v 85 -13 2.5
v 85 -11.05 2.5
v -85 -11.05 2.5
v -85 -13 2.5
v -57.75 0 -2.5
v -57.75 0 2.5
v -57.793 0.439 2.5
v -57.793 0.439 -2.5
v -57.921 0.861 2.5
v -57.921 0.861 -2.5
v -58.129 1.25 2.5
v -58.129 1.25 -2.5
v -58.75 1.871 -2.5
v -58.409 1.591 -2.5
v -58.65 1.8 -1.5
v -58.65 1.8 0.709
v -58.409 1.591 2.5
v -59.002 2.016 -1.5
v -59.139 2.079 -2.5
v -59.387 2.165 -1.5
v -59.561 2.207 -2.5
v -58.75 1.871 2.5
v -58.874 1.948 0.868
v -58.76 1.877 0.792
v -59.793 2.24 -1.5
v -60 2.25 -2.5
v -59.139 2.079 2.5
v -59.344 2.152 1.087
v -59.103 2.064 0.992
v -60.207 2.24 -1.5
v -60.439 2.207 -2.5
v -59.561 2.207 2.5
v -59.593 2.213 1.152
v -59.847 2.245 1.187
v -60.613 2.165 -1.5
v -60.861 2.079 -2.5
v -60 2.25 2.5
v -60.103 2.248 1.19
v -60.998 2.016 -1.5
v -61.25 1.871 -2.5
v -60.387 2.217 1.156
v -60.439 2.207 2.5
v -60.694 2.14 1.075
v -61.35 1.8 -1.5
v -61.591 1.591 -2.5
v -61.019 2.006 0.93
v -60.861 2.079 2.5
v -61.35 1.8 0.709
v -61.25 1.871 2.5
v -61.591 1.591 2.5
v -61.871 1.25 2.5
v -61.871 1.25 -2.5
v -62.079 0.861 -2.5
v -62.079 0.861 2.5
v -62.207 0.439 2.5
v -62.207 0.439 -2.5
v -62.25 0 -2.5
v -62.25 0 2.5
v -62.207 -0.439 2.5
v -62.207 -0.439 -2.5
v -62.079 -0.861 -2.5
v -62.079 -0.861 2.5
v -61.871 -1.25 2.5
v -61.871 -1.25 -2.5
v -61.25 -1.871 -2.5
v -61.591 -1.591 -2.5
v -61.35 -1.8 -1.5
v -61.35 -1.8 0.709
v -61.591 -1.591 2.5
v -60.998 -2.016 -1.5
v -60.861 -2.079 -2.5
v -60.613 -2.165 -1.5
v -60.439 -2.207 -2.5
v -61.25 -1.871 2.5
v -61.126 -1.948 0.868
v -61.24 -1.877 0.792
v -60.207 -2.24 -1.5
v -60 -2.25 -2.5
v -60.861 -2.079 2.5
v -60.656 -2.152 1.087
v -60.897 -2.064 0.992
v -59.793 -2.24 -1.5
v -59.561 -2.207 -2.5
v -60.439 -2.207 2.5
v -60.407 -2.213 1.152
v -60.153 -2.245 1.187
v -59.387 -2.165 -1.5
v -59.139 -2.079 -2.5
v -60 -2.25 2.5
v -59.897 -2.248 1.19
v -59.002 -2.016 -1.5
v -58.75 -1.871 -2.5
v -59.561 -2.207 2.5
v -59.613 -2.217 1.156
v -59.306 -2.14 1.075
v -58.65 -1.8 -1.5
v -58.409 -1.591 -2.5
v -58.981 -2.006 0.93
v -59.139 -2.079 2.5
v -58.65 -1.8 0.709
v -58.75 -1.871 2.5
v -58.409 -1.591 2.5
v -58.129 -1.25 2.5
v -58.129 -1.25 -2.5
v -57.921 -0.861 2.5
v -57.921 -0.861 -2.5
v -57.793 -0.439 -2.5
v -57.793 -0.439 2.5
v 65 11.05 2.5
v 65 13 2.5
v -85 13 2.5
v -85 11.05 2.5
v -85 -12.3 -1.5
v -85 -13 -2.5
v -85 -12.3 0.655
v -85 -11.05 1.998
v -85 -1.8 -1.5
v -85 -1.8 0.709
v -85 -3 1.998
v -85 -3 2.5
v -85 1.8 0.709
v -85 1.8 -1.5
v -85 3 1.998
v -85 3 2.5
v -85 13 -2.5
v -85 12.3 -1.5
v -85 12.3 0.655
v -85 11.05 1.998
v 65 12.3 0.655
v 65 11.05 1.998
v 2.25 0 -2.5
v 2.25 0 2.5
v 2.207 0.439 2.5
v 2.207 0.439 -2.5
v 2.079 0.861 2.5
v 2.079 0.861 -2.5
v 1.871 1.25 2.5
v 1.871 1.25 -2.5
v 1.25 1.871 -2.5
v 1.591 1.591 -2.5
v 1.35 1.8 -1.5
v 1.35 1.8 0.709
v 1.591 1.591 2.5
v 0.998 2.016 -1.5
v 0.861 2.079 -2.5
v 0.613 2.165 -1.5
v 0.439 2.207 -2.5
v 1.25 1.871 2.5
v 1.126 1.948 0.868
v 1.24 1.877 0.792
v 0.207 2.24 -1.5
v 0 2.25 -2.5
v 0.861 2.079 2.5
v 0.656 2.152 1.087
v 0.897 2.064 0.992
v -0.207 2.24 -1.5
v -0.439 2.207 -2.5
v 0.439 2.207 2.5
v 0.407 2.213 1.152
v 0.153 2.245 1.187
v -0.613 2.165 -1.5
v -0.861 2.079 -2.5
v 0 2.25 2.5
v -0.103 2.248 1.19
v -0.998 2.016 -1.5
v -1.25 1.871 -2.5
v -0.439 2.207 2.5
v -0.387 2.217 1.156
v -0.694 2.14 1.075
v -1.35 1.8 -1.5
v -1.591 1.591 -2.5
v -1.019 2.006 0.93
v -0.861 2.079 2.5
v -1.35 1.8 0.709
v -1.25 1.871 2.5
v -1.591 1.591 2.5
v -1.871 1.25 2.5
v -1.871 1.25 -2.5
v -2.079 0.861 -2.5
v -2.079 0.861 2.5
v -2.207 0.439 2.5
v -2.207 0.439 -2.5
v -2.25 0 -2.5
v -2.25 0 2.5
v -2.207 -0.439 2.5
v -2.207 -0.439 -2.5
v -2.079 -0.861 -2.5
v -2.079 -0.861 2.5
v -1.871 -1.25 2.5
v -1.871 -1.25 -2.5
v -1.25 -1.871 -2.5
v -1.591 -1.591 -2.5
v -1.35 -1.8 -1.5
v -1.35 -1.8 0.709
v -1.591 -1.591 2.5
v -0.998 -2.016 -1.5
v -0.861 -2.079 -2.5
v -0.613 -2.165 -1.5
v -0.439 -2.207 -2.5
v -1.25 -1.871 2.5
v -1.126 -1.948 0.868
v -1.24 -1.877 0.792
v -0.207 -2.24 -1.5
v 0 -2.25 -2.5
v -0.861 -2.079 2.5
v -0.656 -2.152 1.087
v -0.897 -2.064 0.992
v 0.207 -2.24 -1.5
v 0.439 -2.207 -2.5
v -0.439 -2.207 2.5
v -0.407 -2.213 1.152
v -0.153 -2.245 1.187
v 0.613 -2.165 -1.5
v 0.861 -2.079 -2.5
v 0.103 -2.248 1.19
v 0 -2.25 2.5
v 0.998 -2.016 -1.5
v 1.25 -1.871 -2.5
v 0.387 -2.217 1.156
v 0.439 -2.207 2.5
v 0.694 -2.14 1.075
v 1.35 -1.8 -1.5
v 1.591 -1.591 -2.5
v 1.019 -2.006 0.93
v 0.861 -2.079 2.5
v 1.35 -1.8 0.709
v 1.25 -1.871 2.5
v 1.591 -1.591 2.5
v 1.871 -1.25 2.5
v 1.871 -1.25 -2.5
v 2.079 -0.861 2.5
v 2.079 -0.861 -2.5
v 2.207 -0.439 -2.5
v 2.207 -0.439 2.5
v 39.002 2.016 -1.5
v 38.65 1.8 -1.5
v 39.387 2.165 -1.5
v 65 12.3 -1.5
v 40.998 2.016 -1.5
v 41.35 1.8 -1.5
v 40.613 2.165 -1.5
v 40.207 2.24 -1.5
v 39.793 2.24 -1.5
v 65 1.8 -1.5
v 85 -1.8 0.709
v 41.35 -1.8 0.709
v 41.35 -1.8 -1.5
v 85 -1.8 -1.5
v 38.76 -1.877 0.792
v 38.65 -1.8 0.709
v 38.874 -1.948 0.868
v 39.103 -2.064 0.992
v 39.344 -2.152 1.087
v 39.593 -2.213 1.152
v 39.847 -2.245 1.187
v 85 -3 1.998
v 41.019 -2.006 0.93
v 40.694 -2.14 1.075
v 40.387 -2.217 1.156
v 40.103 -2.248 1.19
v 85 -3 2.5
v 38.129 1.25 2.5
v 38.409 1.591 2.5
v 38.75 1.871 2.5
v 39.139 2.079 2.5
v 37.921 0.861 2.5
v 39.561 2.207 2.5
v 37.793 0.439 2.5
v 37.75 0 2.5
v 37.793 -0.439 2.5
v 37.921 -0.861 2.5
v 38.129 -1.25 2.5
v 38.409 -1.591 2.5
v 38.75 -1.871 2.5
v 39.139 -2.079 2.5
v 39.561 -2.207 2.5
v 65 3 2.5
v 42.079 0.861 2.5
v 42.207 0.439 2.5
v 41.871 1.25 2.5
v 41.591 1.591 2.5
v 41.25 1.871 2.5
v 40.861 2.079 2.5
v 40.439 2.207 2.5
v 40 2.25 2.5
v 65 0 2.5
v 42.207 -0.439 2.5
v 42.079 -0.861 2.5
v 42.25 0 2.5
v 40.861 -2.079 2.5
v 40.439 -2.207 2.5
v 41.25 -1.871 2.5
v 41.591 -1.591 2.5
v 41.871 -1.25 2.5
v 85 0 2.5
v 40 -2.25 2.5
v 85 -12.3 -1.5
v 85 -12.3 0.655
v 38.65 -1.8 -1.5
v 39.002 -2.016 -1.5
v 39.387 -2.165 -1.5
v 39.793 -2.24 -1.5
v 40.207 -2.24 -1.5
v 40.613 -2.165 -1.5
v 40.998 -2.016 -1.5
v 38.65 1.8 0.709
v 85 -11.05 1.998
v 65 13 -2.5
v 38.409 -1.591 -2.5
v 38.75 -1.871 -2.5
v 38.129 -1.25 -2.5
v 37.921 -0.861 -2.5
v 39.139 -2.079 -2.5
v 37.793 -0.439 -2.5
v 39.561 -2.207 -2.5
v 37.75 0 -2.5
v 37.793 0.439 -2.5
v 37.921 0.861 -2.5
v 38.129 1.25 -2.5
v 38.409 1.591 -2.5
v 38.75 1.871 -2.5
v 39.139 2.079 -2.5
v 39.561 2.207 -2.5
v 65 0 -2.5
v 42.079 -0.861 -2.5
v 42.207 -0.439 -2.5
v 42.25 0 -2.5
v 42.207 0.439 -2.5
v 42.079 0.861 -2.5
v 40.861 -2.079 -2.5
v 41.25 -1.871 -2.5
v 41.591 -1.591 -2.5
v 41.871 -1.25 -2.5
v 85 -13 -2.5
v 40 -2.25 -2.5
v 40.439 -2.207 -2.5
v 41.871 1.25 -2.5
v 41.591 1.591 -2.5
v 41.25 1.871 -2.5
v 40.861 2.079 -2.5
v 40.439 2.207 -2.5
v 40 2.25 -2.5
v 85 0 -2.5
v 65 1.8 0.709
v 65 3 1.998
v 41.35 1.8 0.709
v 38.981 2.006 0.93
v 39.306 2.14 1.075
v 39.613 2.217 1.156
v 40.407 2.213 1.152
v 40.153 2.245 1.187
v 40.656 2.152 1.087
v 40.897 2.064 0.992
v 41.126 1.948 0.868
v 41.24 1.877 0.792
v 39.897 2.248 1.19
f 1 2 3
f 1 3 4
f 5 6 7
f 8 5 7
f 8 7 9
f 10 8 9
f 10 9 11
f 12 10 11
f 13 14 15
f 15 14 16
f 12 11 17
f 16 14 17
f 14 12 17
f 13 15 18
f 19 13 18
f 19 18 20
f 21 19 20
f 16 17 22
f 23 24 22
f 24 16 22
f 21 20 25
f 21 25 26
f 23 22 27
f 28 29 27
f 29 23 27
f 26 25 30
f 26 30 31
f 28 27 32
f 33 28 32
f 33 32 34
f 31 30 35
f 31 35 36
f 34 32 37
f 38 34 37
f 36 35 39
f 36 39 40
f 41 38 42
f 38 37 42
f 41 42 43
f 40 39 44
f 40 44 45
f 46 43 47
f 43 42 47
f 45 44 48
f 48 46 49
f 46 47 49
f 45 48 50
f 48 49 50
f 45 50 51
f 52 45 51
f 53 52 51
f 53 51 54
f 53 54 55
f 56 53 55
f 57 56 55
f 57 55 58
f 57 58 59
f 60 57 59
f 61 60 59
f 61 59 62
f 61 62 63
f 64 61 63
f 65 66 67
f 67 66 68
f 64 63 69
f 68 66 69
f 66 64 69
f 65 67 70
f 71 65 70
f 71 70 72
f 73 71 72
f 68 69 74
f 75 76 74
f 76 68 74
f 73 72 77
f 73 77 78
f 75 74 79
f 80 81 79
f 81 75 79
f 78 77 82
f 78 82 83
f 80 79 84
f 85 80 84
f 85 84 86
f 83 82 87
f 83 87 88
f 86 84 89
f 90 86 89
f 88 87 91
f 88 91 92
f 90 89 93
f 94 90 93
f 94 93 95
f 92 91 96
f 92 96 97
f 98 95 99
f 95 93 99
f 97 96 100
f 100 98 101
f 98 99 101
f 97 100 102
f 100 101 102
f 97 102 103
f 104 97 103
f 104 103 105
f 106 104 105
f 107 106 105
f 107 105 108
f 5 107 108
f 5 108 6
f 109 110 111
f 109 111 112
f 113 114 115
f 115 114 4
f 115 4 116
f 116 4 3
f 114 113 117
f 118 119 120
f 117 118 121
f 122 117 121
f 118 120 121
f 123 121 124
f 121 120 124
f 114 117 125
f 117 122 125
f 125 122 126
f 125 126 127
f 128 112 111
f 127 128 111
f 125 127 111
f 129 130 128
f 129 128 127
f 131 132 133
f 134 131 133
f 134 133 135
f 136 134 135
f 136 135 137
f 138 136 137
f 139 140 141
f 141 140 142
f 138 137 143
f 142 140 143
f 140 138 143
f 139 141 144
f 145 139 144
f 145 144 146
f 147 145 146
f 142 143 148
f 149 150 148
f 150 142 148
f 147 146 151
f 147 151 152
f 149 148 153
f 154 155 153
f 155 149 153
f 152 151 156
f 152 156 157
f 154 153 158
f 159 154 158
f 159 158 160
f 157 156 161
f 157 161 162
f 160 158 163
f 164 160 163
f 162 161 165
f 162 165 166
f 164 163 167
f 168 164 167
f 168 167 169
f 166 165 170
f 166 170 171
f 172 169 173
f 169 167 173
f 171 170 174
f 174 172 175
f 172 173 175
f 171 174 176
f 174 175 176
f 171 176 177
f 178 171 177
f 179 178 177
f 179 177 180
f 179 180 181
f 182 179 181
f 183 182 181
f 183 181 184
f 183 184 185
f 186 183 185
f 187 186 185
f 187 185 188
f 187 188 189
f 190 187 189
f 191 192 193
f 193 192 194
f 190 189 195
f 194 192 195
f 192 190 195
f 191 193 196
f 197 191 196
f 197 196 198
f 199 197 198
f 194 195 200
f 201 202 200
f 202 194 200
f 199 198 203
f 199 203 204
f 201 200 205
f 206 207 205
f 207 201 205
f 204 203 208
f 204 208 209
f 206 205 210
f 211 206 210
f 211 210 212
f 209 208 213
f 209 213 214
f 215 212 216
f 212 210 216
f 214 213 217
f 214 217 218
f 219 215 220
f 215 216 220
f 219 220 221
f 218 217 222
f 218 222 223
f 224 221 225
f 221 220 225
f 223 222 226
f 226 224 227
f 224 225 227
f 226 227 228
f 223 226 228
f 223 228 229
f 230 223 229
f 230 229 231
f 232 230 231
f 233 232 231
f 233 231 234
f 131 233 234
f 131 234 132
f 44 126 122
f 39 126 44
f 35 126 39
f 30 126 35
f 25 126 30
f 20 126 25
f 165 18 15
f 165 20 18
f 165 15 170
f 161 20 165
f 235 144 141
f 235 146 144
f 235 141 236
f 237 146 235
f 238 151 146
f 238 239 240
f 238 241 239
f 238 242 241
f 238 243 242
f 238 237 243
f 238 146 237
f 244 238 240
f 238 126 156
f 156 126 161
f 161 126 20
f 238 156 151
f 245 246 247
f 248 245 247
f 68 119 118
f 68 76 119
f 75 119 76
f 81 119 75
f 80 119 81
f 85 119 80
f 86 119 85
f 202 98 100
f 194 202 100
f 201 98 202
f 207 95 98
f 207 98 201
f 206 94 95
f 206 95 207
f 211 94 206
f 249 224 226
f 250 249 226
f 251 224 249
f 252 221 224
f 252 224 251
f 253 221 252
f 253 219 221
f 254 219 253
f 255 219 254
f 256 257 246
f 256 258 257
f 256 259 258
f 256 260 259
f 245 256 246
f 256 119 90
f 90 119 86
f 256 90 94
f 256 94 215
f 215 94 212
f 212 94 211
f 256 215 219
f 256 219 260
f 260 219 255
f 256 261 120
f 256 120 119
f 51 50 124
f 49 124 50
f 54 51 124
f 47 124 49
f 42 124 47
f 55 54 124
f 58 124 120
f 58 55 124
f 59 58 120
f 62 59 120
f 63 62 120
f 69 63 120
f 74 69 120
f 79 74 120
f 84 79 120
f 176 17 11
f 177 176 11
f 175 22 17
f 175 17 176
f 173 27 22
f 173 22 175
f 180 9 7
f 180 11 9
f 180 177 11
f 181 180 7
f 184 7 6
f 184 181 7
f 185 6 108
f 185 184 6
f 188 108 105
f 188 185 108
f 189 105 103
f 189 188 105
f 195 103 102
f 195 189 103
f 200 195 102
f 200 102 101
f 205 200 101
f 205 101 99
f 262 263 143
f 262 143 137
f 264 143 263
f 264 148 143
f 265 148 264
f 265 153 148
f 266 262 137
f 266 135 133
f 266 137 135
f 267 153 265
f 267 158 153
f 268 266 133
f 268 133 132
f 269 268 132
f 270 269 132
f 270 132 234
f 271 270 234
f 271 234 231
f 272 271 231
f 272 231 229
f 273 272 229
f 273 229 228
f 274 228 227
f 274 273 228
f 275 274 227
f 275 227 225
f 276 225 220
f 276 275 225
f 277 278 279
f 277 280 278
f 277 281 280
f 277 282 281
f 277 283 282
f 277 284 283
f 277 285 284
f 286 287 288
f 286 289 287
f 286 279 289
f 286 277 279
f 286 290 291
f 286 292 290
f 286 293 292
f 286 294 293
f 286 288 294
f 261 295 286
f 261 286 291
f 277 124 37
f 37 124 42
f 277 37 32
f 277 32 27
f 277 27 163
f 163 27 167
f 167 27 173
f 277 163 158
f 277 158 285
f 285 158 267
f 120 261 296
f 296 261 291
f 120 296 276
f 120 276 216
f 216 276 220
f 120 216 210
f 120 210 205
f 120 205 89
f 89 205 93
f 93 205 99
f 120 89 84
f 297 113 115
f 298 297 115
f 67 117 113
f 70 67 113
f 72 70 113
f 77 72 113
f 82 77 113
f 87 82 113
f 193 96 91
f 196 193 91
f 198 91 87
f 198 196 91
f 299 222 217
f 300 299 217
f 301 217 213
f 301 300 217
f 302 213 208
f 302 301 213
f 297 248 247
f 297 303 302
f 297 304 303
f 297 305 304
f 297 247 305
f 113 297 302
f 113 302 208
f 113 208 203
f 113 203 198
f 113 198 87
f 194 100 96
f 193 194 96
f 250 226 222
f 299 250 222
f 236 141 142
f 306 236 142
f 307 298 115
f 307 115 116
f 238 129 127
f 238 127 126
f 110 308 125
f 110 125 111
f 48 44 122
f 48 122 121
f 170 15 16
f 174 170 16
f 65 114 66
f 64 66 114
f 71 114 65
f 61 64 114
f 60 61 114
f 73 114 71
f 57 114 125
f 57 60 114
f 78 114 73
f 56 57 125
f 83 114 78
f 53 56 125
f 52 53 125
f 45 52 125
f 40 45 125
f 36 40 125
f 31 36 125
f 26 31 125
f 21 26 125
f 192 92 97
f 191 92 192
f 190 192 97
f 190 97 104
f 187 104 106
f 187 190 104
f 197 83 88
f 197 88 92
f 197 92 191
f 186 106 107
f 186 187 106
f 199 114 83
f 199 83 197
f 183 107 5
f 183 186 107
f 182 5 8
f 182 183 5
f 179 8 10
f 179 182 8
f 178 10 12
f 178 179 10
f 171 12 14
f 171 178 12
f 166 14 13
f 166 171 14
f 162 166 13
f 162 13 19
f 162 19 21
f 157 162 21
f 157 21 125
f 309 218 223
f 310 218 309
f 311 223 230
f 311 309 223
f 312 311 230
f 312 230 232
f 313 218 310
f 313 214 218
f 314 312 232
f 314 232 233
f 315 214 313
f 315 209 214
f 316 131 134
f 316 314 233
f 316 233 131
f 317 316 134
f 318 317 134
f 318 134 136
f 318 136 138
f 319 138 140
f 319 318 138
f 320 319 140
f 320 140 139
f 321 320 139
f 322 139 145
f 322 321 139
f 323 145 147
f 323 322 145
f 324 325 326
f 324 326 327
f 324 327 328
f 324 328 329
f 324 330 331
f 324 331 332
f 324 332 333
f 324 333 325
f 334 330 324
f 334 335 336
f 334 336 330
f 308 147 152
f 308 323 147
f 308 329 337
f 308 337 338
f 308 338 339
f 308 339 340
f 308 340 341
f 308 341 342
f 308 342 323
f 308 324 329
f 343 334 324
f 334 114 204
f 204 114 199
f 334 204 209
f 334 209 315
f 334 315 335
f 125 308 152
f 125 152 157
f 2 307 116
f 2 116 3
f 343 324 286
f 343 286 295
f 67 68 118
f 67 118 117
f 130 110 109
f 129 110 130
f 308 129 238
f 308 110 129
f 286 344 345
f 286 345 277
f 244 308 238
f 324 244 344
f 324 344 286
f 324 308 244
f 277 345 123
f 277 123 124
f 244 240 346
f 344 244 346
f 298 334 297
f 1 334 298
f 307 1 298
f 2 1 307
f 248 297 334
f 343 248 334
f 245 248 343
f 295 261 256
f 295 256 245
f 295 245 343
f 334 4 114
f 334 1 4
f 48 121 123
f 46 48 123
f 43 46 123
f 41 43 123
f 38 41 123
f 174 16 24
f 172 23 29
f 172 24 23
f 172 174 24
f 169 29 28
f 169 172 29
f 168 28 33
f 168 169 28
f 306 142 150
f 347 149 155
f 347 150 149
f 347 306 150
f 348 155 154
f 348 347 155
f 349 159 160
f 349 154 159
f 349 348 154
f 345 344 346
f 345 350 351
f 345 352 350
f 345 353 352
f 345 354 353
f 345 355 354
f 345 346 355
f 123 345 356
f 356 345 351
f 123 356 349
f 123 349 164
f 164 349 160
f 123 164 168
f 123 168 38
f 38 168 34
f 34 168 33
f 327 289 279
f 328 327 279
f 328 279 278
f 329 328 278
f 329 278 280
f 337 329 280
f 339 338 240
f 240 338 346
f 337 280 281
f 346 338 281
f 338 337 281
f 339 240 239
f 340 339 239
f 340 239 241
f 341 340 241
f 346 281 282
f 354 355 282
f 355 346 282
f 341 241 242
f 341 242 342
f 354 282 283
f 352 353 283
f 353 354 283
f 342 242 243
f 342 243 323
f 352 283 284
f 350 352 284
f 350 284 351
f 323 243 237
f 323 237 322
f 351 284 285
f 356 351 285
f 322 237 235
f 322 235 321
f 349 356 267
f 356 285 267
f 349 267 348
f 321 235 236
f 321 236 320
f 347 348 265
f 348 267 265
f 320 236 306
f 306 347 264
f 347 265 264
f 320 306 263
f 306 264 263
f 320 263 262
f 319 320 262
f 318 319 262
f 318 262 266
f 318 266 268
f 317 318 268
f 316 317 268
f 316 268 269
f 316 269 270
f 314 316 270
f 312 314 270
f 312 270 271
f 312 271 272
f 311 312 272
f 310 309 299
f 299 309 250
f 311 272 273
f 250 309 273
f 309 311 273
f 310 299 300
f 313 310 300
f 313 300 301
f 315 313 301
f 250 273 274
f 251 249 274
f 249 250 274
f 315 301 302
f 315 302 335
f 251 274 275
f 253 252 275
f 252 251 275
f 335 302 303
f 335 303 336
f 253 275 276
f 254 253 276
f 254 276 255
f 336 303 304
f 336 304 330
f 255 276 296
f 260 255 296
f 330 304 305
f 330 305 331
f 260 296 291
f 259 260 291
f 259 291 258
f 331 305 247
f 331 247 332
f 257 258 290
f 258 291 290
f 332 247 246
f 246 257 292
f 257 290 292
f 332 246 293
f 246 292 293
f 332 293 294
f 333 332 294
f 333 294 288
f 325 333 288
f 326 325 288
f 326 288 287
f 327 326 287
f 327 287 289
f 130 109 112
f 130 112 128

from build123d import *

# Parameters (mm, degrees)
F1_DEPTH = 85
F2_W     = 20
F2_H     = 13
F3_DEPTH = 5.001
F4_R     = 2.25
F5_DEPTH = 5


with BuildPart() as f1:
    # F0 (on Right) → F1 (new body, symmetric)
    with BuildSketch(Plane.YZ):
        Polygon((13, -2.5), (13, 2.5), (11.05, 2.5), (11.05, 1.9975107236), (12.3, 0.6552975509), (12.3, -1.5), (1.8, -1.5), (1.8, 0.7089860778), (3, 1.9975107236), (3, 2.5), (-3, 2.5), (-3, 1.9975107236), (-1.8, 0.7089860778), (-1.8, -1.5), (-12.3, -1.5), (-12.3, 0.6552975509), (-11.05, 1.9975107236), (-11.05, 2.5), (-13, 2.5), (-13, -2.5), align=None)
    extrude(amount=F1_DEPTH, both=True)

    # F2 (on face) → F3 (cut, through all)
    with BuildSketch(Plane(origin=(0, 0, -2.5), x_dir=(1, 0, 0), z_dir=(0, 0, -1))):
        with Locations((75, -6.5)):
            Rectangle(F2_W, F2_H)
    extrude(amount=-F3_DEPTH, mode=Mode.SUBTRACT)

    # F4 (on face) → F5 (cut, through all)
    with BuildSketch(Plane.XY.offset(2.5)):
        with Locations((-60, 0)):
            Circle(F4_R)
        Circle(F4_R)
        with Locations((40, 0)):
            Circle(F4_R)
    extrude(amount=-F5_DEPTH, mode=Mode.SUBTRACT)


solid = f1.part
